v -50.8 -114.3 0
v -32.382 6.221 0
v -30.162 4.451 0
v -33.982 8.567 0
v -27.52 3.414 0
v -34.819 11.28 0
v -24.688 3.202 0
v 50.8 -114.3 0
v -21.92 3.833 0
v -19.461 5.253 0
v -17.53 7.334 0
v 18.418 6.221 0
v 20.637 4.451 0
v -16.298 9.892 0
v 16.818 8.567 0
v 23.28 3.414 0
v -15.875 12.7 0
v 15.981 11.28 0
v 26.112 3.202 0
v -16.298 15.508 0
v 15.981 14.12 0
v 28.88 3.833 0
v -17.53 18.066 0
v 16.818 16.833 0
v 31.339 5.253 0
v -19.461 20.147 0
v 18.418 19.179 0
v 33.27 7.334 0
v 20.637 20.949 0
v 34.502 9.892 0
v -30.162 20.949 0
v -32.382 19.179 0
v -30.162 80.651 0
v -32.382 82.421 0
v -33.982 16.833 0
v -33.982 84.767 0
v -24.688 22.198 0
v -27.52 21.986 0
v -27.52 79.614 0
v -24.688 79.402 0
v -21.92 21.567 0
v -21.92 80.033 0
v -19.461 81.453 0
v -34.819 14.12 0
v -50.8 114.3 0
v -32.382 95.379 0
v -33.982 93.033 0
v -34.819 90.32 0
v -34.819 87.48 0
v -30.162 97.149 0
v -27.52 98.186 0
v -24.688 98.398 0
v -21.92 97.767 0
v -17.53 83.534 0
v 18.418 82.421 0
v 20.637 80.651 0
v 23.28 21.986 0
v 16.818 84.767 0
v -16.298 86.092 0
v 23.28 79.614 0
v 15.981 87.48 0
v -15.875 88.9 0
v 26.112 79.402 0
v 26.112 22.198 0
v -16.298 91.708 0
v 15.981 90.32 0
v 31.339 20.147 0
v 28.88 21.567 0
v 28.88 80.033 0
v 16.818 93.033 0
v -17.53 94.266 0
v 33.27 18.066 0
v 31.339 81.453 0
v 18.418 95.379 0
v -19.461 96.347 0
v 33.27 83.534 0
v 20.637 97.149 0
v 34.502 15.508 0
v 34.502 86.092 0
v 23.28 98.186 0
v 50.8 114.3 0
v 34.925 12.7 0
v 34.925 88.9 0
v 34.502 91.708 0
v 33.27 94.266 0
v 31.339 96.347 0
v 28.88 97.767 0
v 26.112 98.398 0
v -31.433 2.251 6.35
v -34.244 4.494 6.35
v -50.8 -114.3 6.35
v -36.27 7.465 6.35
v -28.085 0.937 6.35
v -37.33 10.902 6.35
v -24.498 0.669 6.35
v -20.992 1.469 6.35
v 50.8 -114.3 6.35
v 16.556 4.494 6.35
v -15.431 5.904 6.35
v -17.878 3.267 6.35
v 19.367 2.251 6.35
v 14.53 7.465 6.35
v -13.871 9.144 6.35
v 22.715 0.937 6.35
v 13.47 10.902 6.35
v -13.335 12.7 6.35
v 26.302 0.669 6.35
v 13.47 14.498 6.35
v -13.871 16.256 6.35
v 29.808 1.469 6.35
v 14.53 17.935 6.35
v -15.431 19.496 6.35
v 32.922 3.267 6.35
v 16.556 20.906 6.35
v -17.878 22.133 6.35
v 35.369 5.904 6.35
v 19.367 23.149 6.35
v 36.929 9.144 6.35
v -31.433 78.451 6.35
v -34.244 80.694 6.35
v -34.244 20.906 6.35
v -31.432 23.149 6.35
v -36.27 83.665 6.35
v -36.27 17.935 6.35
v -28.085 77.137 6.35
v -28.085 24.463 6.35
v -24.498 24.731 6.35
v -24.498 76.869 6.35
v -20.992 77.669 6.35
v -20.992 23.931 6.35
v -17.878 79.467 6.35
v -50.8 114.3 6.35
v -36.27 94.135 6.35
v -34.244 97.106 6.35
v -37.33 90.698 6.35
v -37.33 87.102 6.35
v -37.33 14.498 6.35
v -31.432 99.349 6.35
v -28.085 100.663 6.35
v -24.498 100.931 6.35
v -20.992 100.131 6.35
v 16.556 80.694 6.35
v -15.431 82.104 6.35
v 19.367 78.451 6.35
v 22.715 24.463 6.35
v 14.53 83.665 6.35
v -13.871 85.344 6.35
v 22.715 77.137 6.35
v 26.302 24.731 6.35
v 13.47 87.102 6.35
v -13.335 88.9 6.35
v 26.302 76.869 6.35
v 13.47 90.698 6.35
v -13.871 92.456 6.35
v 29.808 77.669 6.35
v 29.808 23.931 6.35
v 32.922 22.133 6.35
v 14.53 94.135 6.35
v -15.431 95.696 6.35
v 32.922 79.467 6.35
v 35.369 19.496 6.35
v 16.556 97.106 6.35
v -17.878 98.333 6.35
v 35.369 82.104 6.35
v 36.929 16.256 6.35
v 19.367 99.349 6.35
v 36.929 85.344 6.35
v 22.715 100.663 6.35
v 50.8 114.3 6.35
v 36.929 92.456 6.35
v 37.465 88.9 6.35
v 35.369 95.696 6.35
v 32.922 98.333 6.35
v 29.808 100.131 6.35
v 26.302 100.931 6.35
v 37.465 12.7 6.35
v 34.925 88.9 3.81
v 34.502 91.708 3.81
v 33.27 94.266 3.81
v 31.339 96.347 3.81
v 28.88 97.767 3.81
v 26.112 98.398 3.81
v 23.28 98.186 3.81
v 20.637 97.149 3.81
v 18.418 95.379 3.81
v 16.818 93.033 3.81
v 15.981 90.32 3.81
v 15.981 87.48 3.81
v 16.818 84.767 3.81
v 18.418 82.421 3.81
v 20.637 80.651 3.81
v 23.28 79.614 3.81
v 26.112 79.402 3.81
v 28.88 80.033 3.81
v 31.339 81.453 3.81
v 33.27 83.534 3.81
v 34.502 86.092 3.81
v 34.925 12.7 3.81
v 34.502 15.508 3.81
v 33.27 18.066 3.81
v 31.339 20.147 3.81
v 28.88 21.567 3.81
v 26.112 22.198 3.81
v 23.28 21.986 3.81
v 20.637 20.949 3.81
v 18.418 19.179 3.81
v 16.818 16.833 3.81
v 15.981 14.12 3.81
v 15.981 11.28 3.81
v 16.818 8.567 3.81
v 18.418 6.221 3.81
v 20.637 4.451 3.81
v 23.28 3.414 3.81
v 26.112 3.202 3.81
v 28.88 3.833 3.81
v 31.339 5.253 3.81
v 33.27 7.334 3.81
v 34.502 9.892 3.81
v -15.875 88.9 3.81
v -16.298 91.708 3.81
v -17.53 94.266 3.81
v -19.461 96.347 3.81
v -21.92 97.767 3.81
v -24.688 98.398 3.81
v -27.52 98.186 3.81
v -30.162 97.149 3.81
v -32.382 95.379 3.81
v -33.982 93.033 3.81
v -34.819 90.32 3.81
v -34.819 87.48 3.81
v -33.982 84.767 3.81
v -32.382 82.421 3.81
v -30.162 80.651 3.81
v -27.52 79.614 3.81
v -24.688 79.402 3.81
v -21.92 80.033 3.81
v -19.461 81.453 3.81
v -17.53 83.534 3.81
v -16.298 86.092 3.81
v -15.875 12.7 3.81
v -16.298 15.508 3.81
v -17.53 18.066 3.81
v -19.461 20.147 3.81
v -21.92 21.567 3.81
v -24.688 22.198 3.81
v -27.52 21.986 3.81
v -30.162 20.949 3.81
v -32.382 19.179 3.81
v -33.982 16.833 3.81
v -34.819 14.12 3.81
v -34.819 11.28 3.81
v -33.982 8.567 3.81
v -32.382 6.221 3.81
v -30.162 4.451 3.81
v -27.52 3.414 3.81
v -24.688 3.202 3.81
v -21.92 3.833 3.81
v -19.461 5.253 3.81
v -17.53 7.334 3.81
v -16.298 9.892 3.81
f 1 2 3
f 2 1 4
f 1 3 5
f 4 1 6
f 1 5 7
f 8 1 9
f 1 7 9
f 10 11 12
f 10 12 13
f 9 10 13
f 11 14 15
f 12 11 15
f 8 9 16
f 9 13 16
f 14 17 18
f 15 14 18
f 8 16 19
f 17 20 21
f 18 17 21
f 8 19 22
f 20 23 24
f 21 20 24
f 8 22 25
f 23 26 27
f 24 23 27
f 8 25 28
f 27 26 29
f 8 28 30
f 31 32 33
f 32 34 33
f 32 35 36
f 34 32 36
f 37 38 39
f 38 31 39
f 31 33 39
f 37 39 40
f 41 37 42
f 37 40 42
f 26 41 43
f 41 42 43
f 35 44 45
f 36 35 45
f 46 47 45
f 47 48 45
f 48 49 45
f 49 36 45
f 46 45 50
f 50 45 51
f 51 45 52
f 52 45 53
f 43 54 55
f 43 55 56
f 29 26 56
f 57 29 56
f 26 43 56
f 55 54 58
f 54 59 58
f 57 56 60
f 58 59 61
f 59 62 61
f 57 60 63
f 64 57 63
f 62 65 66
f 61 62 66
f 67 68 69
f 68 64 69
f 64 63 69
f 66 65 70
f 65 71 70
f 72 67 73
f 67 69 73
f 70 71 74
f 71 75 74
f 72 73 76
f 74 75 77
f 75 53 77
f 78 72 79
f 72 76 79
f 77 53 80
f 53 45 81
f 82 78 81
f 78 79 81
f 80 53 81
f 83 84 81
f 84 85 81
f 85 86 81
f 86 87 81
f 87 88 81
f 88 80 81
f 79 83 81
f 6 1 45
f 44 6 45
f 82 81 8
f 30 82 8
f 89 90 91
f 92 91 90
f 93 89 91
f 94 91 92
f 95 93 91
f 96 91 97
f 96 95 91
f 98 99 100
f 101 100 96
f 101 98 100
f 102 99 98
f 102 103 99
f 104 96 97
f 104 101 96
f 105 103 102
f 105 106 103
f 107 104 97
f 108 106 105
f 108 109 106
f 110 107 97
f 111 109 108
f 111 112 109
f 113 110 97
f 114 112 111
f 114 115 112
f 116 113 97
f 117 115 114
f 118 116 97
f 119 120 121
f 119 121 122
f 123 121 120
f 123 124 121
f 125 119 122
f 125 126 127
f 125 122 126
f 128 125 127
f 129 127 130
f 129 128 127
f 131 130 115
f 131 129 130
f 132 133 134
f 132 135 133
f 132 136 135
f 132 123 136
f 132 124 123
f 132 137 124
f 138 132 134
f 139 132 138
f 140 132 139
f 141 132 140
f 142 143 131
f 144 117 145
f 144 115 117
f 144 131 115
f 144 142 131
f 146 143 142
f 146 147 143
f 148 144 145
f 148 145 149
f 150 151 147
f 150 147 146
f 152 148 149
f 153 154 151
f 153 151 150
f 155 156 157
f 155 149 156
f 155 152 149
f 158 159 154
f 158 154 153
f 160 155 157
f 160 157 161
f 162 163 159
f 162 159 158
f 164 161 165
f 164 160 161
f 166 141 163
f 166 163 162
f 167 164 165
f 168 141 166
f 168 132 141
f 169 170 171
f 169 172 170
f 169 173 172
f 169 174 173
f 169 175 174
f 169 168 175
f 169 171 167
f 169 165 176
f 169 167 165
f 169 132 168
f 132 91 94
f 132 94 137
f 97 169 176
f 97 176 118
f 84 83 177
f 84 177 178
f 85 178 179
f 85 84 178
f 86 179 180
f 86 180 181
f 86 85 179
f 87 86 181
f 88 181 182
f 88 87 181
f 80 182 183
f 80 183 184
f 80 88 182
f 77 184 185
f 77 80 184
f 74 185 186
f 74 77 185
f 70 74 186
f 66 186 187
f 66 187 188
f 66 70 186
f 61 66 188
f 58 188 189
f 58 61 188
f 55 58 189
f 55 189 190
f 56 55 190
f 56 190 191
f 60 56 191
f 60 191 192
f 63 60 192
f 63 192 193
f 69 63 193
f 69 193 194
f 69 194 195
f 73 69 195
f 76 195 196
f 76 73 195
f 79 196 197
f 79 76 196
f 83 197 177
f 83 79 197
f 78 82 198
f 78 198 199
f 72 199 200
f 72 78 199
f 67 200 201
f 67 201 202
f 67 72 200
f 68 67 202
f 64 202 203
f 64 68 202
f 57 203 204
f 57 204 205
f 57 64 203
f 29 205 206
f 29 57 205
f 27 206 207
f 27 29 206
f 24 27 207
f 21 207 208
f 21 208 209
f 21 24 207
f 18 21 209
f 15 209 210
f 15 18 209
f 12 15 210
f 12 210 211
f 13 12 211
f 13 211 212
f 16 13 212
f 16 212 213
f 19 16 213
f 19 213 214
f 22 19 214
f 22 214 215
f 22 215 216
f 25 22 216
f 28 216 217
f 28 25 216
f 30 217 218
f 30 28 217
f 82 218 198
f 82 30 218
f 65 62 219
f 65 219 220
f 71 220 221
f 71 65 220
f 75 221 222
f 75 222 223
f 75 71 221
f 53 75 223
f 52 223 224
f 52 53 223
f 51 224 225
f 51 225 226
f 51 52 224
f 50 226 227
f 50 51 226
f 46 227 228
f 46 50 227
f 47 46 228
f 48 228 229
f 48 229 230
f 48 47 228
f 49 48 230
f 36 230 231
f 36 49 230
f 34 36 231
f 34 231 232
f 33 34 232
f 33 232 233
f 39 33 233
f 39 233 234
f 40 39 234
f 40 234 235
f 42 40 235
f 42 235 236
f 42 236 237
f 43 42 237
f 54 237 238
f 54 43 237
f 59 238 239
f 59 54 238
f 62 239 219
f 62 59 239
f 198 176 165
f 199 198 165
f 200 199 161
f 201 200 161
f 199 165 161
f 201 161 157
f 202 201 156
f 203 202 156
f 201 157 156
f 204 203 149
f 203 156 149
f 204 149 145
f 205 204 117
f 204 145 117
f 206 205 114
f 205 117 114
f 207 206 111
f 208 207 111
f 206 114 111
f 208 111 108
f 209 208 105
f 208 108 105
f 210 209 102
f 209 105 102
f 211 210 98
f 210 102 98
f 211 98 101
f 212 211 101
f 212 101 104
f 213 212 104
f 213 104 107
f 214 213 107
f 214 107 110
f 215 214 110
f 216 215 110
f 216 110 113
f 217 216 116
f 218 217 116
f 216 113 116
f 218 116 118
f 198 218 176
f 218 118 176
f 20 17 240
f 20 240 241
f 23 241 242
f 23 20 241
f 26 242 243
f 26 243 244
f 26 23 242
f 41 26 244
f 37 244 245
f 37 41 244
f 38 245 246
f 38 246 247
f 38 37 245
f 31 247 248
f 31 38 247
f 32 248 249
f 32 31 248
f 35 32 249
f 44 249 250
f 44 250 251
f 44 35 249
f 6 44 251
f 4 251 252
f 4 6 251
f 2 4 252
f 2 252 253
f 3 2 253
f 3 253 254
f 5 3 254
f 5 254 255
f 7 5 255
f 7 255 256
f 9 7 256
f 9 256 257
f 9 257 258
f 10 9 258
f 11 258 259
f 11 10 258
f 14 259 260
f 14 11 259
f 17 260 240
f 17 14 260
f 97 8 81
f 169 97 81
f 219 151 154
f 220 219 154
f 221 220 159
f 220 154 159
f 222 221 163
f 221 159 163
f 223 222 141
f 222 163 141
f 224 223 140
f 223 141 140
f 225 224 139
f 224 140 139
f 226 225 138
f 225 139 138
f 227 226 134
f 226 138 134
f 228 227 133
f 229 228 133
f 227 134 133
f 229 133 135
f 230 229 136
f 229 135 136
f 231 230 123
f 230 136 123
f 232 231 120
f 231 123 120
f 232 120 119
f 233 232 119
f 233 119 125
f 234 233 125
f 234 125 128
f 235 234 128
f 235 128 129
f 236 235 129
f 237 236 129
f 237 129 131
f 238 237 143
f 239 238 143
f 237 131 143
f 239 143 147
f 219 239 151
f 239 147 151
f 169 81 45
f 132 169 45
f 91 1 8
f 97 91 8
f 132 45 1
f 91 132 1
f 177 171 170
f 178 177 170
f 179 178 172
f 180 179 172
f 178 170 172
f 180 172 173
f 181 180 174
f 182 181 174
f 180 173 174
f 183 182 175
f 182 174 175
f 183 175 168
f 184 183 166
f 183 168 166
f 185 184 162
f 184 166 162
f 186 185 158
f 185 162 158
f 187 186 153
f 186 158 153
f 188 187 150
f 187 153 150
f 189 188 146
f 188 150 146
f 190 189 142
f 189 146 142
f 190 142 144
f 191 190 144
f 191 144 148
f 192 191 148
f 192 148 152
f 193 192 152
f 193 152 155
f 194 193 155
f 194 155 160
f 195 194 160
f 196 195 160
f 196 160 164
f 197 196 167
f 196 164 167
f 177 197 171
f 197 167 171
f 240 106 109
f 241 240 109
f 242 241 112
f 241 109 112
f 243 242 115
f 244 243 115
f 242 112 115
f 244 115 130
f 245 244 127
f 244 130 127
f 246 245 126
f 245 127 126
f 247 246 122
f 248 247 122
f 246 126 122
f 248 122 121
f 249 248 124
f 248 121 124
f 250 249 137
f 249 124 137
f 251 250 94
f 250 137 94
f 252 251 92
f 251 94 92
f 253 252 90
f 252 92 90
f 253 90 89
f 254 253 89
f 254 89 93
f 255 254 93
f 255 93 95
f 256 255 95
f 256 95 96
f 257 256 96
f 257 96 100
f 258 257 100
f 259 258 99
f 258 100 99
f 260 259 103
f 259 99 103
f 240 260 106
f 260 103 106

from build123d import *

# Parameters (mm, degrees)
F0_R     = 9.525
F1_DEPTH = 6.35
F2_SIZE  = 2.54


with BuildPart() as f1:
    # F0 (on Top) → F1 (new body)
    with BuildSketch(Plane.XY):
        Polygon((50.8, 114.3), (-50.8, 114.3), (-50.8, 0), (-50.8, -114.3), (50.8, -114.3), (50.8, 0), align=None)
        with Locations((-25.4, 12.7)):
            Circle(F0_R, mode=Mode.SUBTRACT)
        with Locations((-25.4, 88.9)):
            Circle(F0_R, mode=Mode.SUBTRACT)
        with Locations((25.4, 12.7)):
            Circle(F0_R, mode=Mode.SUBTRACT)
        with Locations((25.4, 88.9)):
            Circle(F0_R, mode=Mode.SUBTRACT)
    extrude(amount=F1_DEPTH)

    # F2
    f2_edges = [f1.edges().sort_by_distance(p)[0] for p in [
        (-34.925, 88.9, 6.35),
        (15.875, 88.9, 6.35),
        (15.875, 12.7, 6.35),
        (-34.925, 12.7, 6.35),
    ]]
    chamfer(f2_edges, length=F2_SIZE)


solid = f1.part
